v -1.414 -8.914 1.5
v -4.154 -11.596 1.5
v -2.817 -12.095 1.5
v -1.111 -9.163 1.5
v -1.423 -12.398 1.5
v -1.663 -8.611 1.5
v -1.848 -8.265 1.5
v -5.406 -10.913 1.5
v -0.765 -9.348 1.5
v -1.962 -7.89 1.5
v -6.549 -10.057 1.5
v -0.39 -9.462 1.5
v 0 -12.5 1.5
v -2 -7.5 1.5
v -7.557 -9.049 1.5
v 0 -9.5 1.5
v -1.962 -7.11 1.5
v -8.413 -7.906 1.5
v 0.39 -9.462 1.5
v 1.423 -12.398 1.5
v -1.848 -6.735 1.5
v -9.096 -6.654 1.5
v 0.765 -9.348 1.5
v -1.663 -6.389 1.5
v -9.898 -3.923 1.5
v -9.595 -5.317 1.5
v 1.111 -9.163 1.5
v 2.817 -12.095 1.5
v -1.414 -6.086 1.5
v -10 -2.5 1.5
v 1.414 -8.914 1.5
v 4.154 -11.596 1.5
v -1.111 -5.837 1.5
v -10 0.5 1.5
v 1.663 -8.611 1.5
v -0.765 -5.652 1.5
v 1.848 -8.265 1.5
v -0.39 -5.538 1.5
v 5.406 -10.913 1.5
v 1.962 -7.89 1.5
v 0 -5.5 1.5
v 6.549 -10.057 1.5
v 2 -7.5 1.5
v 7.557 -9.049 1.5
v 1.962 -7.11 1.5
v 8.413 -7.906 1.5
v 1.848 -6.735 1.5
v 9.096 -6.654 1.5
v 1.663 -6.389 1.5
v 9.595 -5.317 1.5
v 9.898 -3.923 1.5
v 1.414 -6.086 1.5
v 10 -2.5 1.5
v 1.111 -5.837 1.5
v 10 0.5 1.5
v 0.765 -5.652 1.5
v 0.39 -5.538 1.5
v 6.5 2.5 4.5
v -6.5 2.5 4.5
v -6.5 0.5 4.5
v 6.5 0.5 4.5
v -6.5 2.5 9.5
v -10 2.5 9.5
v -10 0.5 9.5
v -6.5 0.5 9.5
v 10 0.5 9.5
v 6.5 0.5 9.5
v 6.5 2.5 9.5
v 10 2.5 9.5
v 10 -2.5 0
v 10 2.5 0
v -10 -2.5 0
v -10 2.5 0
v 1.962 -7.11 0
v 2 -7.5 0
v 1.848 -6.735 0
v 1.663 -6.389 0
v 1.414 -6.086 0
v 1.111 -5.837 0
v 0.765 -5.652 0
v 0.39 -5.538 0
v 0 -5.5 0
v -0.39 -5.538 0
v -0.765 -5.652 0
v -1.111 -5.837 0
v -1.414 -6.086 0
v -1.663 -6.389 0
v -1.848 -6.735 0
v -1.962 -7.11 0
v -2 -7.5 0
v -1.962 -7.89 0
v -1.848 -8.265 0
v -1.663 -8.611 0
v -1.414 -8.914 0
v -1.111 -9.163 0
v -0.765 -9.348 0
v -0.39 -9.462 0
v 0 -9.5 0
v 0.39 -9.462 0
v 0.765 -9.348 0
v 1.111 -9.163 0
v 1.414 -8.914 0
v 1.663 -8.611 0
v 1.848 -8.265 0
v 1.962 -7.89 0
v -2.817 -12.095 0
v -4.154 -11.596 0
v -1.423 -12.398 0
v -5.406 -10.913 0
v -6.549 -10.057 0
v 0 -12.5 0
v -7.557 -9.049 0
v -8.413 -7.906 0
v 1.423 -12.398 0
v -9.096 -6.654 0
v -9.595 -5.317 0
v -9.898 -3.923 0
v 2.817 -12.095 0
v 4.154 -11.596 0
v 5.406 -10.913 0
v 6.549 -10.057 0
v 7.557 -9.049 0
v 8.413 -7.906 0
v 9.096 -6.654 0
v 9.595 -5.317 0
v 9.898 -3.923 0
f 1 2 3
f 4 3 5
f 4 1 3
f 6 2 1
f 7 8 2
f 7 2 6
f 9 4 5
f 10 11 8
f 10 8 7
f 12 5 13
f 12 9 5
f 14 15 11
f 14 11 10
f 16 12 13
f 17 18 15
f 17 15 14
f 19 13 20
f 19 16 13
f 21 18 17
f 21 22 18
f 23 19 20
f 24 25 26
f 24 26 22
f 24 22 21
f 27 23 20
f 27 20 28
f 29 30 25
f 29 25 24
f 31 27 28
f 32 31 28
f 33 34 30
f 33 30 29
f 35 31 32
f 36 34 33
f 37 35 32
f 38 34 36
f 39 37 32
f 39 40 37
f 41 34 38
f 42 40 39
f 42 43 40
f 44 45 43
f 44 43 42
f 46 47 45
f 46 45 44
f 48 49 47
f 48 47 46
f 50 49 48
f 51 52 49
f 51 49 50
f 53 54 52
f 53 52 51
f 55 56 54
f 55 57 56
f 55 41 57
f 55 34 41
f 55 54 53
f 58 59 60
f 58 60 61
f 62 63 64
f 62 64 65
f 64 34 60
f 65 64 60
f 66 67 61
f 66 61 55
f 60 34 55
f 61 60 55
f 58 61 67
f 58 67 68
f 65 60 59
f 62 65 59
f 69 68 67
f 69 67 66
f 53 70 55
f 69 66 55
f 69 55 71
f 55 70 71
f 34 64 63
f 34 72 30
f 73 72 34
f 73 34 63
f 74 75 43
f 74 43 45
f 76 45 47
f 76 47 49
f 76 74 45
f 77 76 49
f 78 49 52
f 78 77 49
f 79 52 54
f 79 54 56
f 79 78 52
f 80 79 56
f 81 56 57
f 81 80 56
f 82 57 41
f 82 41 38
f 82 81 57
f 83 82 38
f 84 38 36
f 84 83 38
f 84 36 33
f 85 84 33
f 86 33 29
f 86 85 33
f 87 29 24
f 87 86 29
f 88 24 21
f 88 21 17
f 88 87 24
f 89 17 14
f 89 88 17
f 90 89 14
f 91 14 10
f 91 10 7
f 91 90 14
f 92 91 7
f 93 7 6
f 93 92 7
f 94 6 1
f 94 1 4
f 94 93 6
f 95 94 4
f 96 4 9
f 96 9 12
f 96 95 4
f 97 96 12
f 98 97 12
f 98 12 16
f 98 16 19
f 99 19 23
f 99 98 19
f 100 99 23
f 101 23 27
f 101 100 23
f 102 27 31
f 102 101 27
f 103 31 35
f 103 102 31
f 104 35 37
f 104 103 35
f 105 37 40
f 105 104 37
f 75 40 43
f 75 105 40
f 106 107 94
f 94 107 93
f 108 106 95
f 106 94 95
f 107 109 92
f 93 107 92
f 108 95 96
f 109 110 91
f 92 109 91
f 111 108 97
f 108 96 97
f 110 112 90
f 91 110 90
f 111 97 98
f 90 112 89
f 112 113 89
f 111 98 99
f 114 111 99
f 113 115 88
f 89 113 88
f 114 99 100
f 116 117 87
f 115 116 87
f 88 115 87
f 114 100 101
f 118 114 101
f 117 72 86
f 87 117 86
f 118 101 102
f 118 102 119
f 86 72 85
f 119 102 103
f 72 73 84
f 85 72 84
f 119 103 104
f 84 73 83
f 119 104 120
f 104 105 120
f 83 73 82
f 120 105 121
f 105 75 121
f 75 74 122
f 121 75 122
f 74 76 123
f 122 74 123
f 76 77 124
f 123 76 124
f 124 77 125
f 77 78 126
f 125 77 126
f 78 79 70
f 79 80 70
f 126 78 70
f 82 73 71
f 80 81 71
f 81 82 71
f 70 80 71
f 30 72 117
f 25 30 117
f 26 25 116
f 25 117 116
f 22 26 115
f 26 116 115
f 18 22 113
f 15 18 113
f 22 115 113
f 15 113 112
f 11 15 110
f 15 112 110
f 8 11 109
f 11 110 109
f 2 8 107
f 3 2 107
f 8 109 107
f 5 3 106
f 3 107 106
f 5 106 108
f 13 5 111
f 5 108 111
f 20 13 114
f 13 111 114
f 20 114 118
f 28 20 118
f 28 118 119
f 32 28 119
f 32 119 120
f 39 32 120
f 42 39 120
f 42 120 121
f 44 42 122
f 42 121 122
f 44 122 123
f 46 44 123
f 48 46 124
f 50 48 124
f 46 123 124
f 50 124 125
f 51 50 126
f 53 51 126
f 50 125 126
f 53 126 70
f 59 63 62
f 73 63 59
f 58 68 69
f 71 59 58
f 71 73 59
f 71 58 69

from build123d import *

# Parameters (mm, degrees)
F0_W     = 20
F0_H     = 5
F0_R     = 2
F1_DEPTH = 1.5
F2_W     = 3.5
F2_H     = 2
F3_DEPTH = 8
F4_W     = 13
F4_H     = 2
F5_DEPTH = 3


with BuildPart() as f1:
    # F0 (on Top) → F1 (new body)
    with BuildSketch(Plane.XY):
        Rectangle(F0_W, F0_H)
        with BuildLine():
            ThreePointArc((-10, -2.5), (0, -12.5), (10, -2.5))
            Line((10, -2.5), (-10, -2.5))
        make_face()
        with Locations((0, -7.5)):
            Circle(F0_R, mode=Mode.SUBTRACT)
    extrude(amount=F1_DEPTH)

    # F2 (on face) → F3 (join)
    with BuildSketch(Plane.XY.offset(1.5)):
        with Locations((-8.25, 1.5)):
            Rectangle(F2_W, F2_H)
        with Locations((8.25, 1.5)):
            Rectangle(F2_W, F2_H)
    extrude(amount=F3_DEPTH)

    # F4 (on face) → F5 (join)
    with BuildSketch(Plane.XY.offset(1.5)):
        with Locations((0, 1.5)):
            Rectangle(F4_W, F4_H)
    extrude(amount=F5_DEPTH)


solid = f1.part
